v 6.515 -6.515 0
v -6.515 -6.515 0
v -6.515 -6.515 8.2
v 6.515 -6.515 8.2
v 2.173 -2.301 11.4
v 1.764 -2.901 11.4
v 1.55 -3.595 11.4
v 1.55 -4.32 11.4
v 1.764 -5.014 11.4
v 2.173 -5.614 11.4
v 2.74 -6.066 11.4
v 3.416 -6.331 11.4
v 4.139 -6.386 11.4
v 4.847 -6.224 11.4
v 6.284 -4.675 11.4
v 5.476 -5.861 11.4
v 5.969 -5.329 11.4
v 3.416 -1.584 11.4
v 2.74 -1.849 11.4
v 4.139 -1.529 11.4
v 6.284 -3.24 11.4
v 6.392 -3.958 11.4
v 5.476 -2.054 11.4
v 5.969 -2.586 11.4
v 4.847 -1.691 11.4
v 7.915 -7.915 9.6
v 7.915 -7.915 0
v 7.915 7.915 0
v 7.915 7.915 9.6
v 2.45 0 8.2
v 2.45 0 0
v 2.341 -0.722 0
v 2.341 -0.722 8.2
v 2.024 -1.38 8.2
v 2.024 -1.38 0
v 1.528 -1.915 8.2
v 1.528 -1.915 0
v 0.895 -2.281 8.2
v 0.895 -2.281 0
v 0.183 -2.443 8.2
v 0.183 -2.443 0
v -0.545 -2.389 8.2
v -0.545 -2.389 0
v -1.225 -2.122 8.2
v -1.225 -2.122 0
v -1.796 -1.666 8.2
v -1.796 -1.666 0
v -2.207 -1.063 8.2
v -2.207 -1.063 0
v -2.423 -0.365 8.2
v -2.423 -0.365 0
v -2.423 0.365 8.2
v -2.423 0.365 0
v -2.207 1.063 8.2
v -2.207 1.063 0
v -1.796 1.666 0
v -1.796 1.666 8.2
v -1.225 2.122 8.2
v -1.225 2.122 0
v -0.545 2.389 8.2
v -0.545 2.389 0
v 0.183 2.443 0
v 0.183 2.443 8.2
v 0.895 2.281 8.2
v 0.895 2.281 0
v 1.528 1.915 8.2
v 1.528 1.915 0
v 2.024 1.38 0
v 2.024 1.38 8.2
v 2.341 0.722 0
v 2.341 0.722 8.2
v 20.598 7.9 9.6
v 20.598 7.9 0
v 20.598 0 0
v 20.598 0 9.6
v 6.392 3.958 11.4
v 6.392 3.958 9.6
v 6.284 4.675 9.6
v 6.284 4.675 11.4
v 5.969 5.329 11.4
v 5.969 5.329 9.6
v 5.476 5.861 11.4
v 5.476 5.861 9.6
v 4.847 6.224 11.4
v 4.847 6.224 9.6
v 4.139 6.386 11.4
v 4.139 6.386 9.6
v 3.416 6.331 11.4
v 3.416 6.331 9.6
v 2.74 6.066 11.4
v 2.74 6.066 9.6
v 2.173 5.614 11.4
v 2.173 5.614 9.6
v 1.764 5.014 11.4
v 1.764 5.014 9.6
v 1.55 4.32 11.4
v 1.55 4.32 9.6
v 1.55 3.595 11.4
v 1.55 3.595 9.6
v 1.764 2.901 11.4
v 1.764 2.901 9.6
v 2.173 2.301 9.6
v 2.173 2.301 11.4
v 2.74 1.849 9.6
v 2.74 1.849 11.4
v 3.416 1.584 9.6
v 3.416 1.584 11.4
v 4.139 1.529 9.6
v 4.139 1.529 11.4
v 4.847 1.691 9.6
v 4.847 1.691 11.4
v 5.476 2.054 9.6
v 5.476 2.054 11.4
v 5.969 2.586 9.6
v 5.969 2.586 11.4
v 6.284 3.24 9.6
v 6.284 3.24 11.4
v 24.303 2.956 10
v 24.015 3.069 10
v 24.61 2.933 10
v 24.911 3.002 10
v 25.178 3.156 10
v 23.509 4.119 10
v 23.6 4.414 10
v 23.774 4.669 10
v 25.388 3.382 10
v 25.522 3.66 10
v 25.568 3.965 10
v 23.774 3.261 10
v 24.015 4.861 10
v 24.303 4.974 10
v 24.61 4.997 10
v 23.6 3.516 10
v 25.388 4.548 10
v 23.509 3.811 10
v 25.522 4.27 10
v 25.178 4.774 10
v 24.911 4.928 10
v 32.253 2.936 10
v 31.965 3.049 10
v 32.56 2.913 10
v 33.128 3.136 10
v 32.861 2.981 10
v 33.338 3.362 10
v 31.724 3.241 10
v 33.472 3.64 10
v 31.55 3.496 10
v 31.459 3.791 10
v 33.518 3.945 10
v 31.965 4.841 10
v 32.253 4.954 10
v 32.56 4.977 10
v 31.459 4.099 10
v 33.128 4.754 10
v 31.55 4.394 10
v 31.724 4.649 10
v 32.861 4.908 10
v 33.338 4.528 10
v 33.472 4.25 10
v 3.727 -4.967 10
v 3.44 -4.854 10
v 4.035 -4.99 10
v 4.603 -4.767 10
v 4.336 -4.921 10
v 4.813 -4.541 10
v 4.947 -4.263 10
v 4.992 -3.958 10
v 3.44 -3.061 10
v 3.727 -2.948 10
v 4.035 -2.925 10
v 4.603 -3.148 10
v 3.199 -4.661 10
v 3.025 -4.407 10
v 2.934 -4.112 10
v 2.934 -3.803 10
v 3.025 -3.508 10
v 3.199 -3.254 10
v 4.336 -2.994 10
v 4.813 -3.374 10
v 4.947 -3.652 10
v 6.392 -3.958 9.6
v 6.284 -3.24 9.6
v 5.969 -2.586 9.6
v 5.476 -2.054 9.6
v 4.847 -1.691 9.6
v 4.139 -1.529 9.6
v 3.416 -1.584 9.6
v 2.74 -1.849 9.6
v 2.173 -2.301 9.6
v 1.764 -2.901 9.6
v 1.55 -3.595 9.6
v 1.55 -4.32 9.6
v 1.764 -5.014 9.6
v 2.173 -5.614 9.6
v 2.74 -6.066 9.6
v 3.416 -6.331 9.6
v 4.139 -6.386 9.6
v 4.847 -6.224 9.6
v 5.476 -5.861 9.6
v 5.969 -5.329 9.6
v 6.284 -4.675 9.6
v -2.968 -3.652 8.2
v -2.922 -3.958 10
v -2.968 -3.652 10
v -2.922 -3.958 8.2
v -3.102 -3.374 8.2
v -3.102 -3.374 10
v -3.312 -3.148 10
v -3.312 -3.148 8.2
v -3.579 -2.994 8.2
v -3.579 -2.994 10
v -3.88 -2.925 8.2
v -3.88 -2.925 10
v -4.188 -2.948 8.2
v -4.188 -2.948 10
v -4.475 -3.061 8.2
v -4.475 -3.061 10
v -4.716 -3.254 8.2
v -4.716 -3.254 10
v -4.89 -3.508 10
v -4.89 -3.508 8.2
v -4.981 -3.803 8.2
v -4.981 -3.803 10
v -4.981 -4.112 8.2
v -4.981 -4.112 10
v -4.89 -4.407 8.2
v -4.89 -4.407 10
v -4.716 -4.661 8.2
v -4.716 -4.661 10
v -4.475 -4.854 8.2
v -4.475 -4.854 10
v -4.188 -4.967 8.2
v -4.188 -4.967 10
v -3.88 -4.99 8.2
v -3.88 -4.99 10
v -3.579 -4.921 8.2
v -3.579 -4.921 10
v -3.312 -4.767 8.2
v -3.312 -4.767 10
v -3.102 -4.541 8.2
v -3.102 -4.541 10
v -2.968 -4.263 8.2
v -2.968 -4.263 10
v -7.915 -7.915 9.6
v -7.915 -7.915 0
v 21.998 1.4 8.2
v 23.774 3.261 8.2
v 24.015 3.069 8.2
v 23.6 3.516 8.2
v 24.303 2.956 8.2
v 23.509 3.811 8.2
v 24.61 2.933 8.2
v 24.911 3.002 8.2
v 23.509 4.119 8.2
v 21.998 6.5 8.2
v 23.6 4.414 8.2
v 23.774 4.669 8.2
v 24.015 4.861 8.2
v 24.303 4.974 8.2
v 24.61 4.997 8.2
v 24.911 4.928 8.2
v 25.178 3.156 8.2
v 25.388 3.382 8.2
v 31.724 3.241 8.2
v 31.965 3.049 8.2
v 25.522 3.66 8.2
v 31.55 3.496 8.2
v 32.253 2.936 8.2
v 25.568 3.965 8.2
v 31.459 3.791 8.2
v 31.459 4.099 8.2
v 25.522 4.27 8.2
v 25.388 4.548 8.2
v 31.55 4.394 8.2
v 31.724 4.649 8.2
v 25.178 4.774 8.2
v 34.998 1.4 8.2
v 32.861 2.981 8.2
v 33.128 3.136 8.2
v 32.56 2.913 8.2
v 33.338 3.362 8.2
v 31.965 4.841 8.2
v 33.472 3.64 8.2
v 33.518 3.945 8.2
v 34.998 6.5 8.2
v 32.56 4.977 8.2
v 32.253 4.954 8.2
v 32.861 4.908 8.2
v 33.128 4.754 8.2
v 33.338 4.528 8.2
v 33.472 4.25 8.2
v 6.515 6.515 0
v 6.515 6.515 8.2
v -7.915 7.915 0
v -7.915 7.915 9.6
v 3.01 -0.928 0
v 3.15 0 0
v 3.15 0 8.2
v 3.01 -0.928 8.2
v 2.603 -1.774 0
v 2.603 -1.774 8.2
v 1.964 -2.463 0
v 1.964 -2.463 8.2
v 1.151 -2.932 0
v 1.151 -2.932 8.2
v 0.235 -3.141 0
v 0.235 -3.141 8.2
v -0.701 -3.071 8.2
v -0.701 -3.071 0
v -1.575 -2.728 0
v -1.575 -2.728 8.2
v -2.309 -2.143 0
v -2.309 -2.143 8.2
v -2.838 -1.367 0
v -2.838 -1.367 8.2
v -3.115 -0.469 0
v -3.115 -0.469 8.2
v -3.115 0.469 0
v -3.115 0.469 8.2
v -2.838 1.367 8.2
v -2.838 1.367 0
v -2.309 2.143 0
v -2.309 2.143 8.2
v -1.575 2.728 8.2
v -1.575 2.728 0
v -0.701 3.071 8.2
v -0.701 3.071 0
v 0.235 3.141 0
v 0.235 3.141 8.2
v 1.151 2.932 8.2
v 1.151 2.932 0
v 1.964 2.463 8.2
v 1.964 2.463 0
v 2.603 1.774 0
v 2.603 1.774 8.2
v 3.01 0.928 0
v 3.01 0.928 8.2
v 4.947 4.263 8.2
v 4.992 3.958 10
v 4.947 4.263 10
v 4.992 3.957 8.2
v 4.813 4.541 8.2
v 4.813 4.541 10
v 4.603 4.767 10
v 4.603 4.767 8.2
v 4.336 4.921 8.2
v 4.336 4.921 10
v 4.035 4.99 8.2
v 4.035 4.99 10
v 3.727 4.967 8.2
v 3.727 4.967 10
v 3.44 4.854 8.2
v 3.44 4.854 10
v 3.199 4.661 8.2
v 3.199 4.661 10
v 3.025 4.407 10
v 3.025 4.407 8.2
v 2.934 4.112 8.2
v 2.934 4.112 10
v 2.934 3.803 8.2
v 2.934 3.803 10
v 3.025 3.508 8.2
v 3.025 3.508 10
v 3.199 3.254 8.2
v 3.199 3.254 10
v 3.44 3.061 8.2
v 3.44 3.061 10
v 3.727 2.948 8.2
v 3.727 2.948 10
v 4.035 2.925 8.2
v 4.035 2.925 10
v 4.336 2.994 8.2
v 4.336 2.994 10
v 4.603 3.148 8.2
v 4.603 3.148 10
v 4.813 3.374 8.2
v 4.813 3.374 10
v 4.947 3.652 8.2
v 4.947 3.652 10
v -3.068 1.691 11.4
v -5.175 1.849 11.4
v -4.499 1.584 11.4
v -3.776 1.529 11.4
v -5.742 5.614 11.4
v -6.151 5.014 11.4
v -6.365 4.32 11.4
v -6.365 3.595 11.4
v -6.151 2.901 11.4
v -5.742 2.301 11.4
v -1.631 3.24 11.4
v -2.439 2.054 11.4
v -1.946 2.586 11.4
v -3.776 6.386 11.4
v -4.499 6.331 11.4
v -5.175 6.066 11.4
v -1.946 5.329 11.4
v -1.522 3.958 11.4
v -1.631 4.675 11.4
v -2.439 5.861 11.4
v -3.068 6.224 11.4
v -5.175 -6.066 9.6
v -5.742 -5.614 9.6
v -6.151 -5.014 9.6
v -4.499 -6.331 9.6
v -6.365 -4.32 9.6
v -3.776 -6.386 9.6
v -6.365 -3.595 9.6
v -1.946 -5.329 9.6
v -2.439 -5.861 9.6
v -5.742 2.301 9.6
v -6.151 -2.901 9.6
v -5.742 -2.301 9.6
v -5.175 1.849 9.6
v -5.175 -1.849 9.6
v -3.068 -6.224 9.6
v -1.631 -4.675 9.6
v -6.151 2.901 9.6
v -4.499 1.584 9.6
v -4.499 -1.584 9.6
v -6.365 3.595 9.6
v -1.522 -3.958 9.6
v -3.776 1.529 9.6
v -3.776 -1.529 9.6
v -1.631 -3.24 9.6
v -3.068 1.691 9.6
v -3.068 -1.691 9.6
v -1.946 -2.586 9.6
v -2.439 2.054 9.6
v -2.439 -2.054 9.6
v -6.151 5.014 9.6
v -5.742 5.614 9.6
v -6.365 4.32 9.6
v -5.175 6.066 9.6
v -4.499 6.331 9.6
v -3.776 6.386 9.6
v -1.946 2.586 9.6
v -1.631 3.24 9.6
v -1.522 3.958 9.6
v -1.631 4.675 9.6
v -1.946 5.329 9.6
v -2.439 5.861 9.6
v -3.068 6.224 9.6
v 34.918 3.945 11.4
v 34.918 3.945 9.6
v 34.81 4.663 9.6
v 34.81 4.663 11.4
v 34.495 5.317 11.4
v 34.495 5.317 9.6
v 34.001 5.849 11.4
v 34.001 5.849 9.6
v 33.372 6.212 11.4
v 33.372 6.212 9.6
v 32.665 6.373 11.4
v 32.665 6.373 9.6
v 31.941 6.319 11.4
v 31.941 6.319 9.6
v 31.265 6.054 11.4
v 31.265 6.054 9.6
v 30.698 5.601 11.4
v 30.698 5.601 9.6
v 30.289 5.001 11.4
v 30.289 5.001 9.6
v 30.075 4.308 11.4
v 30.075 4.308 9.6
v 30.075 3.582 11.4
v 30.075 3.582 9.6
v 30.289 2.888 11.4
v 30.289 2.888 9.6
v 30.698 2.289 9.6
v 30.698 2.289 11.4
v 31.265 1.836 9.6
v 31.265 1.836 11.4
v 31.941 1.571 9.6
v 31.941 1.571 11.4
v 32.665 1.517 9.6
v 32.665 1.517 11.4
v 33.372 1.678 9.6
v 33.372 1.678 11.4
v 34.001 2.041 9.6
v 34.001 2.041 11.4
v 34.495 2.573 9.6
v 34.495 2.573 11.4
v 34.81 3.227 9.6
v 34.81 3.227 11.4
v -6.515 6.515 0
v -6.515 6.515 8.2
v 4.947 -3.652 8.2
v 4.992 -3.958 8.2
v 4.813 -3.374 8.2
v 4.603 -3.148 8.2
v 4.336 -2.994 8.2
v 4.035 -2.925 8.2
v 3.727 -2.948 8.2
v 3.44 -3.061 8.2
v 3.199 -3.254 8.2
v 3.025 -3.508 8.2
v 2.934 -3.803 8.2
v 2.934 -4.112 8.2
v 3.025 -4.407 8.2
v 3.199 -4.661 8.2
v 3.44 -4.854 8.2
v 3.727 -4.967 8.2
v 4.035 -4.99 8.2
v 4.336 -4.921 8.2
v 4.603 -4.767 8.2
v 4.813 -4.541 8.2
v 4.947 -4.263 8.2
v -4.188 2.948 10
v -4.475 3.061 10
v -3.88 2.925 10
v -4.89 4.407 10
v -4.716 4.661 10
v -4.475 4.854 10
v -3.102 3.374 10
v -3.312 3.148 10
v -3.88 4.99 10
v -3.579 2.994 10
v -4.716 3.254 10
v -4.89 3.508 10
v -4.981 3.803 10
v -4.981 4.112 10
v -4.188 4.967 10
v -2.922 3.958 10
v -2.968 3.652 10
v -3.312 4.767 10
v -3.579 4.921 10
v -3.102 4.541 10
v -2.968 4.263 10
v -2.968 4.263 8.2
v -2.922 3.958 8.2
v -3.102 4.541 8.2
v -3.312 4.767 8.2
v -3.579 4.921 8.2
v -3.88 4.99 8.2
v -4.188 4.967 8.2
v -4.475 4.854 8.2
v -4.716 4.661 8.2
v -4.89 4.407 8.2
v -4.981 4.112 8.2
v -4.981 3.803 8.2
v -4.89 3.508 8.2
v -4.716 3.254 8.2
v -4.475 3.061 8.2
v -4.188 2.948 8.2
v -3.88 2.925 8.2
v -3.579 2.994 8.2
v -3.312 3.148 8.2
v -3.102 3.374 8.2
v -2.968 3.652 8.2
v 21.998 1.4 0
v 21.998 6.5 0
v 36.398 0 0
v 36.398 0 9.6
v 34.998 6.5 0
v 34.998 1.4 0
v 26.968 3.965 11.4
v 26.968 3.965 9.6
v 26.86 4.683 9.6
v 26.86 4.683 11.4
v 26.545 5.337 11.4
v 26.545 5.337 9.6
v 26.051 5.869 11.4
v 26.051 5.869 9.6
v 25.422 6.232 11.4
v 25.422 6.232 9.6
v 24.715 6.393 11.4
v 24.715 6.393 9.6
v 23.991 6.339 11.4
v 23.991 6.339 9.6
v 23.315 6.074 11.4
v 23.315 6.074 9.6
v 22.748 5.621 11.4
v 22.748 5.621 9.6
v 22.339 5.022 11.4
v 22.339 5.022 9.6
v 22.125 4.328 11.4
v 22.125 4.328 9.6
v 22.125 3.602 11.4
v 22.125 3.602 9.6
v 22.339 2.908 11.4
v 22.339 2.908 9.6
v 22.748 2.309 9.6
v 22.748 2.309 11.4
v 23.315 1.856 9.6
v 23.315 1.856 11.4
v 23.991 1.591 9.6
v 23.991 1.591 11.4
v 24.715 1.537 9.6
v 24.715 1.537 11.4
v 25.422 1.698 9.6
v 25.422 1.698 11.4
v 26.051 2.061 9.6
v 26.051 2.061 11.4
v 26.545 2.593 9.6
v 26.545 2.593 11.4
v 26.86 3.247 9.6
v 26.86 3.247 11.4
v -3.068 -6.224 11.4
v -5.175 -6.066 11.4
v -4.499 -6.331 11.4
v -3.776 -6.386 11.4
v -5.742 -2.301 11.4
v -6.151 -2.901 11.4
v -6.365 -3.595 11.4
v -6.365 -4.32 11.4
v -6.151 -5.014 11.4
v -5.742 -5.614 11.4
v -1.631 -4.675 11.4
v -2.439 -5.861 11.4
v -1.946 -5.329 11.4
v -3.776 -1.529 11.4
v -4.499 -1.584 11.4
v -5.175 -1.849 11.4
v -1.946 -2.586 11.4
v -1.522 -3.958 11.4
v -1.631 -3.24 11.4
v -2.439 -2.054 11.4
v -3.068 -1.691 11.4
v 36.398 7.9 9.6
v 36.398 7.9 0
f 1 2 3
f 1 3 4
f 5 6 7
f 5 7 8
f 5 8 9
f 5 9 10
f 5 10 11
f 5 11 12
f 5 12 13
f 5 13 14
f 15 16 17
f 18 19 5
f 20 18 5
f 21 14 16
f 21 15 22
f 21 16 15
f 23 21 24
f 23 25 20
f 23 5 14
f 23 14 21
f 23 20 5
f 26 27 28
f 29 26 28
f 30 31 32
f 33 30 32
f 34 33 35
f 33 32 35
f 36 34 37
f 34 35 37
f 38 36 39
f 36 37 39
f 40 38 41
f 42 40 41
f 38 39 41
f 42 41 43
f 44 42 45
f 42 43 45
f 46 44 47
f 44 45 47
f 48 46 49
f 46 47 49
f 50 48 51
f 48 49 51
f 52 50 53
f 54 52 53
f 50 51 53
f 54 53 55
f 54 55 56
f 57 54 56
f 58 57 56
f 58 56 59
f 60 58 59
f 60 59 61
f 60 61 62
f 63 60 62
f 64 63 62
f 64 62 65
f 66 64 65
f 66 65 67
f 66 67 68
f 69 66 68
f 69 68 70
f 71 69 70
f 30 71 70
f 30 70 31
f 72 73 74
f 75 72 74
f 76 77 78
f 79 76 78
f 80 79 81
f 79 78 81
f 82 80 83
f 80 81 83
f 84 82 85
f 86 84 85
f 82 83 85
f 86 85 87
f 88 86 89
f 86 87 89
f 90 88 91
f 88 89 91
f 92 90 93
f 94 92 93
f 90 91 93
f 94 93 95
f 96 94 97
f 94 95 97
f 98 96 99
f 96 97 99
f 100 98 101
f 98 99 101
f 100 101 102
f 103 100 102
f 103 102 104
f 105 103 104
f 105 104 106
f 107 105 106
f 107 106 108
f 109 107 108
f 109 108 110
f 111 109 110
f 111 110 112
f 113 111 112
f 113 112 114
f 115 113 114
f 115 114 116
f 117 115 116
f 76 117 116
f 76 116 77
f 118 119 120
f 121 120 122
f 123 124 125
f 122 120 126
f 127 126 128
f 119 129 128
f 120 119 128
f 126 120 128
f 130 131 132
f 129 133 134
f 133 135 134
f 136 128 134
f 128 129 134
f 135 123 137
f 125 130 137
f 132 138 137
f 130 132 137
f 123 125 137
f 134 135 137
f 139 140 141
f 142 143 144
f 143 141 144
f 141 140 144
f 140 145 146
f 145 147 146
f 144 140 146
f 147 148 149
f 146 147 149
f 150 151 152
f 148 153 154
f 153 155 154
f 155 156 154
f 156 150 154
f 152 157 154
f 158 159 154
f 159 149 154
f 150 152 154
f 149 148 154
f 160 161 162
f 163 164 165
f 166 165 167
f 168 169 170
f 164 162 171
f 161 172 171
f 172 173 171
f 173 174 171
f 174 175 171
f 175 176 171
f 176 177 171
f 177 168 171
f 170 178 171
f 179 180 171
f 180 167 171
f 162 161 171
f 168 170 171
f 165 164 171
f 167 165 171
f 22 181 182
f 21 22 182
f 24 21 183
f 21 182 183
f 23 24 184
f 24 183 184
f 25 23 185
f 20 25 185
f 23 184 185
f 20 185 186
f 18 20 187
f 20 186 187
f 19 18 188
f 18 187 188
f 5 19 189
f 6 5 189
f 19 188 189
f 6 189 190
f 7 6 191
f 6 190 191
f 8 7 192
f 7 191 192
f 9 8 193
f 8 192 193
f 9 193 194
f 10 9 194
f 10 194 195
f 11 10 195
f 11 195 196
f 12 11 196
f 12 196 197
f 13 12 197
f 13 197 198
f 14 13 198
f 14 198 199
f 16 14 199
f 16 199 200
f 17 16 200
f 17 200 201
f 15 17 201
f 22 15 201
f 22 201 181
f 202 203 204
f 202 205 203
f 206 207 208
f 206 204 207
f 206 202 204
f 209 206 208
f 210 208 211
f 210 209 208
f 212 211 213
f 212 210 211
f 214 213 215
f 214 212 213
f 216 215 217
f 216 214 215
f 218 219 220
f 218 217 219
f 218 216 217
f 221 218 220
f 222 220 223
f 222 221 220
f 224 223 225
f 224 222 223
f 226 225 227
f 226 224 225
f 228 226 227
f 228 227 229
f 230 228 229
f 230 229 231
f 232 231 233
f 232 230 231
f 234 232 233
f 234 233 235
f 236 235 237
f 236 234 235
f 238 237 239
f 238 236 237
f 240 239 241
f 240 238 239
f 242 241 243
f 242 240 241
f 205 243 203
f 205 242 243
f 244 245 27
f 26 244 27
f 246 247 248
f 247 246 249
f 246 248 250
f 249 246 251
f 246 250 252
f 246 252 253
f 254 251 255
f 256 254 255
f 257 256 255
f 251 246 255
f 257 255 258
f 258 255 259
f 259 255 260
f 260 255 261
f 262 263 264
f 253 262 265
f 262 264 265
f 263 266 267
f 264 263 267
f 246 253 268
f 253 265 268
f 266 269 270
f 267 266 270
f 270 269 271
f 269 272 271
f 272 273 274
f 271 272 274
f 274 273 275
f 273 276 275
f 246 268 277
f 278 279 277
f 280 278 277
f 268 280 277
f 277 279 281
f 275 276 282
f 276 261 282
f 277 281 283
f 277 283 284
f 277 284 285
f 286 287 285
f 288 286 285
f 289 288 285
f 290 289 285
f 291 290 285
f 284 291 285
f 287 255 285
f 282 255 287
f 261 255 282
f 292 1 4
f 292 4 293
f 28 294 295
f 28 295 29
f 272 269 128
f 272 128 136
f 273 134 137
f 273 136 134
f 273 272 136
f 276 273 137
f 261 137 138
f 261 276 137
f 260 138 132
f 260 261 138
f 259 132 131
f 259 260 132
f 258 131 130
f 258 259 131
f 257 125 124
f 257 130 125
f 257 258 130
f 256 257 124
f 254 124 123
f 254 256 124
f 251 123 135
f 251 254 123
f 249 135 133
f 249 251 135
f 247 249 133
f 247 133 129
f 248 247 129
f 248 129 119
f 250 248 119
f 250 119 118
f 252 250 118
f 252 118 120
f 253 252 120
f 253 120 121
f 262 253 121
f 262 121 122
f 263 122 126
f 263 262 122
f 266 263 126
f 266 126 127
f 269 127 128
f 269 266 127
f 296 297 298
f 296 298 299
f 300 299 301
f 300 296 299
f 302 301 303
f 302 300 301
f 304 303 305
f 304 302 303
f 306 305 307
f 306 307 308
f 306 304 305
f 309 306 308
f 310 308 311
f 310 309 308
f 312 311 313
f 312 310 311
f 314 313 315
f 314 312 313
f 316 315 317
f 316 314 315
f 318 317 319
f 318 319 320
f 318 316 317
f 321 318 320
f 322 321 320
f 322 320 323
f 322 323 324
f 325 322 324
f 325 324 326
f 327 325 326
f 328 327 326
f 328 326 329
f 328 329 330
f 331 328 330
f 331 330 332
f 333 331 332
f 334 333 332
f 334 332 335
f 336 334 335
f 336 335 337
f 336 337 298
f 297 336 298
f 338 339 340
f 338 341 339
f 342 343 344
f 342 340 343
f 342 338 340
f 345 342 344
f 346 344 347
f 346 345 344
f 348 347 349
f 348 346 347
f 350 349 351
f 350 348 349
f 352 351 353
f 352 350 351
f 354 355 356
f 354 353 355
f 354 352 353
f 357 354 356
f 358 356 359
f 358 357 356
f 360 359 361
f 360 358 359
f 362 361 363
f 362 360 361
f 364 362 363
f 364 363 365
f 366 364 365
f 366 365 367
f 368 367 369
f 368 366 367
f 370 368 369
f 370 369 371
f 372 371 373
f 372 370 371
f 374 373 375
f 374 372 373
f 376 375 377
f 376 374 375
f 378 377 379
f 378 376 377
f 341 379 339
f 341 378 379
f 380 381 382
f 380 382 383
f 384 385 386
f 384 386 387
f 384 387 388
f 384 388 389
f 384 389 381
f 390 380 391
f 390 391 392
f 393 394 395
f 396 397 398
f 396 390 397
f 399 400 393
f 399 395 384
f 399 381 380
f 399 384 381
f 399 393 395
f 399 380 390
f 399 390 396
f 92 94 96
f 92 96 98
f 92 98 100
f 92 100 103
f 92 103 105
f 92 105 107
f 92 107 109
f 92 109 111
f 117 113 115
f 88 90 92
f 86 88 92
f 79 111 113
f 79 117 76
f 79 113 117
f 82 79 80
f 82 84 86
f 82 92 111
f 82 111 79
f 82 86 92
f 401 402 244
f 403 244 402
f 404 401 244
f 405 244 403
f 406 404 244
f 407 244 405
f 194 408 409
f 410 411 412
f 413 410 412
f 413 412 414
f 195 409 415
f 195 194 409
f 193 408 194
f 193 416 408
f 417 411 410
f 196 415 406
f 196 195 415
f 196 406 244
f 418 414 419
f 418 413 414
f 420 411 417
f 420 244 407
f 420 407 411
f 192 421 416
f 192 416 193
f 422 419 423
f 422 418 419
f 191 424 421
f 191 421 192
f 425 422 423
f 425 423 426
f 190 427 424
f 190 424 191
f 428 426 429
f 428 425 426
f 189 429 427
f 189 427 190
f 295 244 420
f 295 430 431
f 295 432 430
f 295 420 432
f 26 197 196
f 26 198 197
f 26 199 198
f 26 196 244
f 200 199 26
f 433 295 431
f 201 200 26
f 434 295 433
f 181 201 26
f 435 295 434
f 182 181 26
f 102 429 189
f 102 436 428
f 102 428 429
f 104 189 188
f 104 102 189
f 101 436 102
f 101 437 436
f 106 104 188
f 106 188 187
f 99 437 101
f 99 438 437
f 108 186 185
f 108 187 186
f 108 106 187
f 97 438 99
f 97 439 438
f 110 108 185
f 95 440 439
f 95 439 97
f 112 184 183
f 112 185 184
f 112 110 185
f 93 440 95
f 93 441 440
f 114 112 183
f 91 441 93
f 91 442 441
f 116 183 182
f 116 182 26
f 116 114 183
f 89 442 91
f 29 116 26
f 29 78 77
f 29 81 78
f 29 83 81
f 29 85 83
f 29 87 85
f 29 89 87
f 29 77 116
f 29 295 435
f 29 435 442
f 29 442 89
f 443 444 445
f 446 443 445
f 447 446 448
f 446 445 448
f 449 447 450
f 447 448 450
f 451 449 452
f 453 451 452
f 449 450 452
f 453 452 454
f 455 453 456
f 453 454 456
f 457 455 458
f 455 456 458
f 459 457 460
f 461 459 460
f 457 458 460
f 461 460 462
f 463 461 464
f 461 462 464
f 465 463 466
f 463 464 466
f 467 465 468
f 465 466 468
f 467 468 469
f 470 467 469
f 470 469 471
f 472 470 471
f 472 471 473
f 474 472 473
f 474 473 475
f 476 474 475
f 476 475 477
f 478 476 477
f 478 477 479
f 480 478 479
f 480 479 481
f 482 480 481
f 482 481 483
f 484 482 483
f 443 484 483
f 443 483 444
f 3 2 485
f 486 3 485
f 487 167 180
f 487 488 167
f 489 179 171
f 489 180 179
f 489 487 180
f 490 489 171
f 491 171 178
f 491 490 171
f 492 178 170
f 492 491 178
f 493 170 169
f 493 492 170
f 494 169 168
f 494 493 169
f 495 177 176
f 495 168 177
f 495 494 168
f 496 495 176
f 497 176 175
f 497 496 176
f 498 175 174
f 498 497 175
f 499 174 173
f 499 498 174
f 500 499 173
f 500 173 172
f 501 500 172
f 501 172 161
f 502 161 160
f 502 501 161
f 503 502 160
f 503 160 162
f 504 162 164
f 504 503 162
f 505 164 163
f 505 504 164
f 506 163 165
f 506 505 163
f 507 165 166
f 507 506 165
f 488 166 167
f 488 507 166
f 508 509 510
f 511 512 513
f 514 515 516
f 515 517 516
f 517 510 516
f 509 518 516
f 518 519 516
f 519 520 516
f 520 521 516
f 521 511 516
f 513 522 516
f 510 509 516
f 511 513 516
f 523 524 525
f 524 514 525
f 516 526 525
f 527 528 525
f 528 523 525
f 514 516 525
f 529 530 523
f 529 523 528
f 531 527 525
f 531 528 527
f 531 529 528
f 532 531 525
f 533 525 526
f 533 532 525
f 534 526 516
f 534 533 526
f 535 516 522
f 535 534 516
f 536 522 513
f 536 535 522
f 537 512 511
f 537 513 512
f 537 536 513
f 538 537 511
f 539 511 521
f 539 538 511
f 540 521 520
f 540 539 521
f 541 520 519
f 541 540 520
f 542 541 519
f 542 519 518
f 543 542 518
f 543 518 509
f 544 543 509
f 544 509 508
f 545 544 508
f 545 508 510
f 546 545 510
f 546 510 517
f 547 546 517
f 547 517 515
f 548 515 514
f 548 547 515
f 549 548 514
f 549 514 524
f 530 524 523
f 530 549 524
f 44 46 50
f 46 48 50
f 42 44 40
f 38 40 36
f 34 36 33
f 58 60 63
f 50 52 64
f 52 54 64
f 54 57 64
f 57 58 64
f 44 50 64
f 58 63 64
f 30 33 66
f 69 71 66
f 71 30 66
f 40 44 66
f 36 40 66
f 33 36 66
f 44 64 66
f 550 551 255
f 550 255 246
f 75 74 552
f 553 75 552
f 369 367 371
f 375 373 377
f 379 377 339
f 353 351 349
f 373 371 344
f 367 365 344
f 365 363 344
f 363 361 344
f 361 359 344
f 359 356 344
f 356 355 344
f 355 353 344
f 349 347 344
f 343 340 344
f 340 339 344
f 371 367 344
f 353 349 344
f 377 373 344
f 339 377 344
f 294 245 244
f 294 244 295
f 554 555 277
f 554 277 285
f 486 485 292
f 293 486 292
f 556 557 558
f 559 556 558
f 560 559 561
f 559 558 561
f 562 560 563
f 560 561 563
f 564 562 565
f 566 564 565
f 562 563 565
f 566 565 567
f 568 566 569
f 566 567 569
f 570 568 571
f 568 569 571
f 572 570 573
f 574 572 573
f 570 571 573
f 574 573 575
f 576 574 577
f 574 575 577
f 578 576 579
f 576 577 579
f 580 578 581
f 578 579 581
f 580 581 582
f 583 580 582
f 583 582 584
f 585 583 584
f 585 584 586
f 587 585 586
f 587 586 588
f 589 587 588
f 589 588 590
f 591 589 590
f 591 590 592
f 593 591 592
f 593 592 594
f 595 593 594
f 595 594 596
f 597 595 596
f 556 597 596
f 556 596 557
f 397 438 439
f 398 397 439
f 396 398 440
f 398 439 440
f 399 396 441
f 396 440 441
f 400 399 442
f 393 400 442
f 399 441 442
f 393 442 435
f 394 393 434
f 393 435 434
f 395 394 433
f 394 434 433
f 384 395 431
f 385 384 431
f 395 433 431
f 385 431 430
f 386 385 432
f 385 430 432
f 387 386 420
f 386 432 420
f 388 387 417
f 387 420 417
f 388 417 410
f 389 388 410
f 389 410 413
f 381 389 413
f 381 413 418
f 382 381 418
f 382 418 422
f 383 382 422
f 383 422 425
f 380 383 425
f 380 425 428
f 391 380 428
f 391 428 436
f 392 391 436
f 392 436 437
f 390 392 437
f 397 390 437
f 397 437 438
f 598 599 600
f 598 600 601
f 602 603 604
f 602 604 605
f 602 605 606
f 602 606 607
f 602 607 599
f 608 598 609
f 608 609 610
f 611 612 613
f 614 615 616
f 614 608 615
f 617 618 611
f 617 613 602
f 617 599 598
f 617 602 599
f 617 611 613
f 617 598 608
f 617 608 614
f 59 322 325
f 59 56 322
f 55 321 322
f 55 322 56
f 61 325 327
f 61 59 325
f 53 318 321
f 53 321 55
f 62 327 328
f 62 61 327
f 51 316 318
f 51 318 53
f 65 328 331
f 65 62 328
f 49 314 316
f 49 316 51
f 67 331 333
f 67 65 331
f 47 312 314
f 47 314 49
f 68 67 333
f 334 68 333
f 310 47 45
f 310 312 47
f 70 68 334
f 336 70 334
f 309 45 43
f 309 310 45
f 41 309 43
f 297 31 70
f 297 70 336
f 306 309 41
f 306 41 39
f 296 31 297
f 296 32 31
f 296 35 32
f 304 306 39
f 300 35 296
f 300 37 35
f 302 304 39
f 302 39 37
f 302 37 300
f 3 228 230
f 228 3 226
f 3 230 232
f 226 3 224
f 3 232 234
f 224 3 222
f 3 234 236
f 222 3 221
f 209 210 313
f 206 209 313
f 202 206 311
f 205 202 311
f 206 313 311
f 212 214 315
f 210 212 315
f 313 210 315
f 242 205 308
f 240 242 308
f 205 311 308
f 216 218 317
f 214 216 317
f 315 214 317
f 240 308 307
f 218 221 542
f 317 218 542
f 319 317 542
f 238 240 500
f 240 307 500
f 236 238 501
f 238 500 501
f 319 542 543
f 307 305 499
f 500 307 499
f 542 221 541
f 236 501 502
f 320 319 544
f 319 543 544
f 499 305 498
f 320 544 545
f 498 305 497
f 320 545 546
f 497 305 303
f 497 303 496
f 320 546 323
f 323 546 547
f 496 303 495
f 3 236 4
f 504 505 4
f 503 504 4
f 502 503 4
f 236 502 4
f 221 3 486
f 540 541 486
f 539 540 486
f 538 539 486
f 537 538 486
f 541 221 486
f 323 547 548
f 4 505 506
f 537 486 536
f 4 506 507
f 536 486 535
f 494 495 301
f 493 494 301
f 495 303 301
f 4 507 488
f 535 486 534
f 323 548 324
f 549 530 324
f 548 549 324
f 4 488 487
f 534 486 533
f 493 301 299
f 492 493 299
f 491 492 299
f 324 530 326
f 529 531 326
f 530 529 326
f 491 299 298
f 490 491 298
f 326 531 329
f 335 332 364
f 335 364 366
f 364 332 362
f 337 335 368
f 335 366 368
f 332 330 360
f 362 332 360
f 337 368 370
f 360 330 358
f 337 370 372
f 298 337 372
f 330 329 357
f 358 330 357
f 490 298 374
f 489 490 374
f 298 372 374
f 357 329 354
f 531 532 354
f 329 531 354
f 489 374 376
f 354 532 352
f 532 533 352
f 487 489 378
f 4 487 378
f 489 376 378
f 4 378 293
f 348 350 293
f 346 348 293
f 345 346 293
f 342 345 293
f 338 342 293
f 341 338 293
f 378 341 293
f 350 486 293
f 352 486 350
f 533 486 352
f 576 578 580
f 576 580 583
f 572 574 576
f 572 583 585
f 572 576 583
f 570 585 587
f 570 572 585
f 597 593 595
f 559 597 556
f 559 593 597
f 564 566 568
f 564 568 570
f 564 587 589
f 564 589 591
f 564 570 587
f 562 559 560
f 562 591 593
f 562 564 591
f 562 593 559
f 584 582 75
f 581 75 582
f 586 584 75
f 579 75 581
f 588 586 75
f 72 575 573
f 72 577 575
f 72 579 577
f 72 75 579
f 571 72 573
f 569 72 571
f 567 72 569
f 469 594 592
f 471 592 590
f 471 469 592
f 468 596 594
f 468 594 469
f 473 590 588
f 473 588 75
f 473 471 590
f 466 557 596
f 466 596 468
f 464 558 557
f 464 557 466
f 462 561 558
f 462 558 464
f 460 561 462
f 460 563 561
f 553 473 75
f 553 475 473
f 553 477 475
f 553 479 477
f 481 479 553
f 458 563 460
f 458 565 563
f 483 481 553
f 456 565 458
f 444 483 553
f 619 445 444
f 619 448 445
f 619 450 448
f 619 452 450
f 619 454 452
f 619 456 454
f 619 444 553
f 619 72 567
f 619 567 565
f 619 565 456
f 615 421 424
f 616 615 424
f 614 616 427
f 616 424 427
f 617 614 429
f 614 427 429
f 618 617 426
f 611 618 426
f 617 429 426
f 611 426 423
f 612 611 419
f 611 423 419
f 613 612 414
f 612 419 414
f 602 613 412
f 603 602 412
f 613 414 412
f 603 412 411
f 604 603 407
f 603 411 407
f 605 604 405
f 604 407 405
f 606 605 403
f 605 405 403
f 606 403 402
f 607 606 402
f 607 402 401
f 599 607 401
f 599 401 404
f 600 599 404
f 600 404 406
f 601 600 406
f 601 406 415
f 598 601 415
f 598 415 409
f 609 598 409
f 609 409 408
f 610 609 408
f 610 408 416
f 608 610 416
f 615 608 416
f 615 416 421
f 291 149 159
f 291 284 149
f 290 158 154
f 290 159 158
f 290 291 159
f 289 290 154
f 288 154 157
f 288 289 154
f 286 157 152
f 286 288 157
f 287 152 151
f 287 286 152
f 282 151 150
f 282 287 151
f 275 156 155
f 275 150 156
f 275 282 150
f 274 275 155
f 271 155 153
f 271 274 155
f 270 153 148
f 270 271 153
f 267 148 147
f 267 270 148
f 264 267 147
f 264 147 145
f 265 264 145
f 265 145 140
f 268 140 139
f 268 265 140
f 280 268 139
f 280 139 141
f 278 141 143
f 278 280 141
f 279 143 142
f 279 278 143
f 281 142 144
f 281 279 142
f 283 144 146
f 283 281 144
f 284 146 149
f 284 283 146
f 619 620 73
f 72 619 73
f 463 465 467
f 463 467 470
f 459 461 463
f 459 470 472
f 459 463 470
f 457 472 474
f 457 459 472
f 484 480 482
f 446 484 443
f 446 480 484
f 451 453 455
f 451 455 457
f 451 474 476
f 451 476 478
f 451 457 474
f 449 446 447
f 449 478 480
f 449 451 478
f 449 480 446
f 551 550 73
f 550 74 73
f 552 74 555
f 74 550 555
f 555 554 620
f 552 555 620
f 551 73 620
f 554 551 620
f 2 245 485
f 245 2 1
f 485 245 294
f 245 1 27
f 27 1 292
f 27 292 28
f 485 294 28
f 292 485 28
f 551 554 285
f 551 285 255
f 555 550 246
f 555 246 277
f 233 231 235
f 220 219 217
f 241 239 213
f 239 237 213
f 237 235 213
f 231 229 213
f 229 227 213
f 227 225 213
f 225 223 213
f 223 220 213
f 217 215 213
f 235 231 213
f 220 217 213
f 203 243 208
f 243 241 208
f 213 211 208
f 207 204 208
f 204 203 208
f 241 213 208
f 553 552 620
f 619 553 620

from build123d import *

# Parameters (mm, degrees)
F0_W     = 15.83
F0_H     = 15.83
F0_R     = 2.435
F1_DEPTH = 9.6
F2_DEPTH = 11.4
F4_T     = -1.4
F5_T     = -1.4
F3_R     = 3.15
F3_R_2   = 2.45
F6_DEPTH = 9.5


with BuildPart() as f1:
    # F0 (on Top) → F1 (new body)
    with BuildSketch(Plane.XY):
        Rectangle(F0_W, F0_H)
        with Locations((-3.9575, -3.9575)):
            Circle(F0_R, mode=Mode.SUBTRACT)
        with Locations((3.9575, -3.9575)):
            Circle(F0_R, mode=Mode.SUBTRACT)
        with Locations((-3.9575, 3.9575)):
            Circle(F0_R, mode=Mode.SUBTRACT)
        with Locations((3.9575, 3.9575)):
            Circle(F0_R, mode=Mode.SUBTRACT)
    extrude(amount=F1_DEPTH)

    # F0 (on Top) → F2, piece 2 (join)
    with BuildSketch(Plane.XY):
        with Locations((-3.9575, 3.9575)):
            Circle(F0_R)
        with Locations((3.9575, 3.9575)):
            Circle(F0_R)
        with Locations((3.9575, -3.9575)):
            Circle(F0_R)
        with Locations((-3.9575, -3.9575)):
            Circle(F0_R)
    extrude(amount=F2_DEPTH)

    # F4
    f4_openings = [f1.faces().sort_by_distance(p)[0] for p in [
        (0, 0, 0),
    ]]
    offset(amount=F4_T, openings=f4_openings, kind=Kind.INTERSECTION)

    # F3 (on face) → F6 (join)
    with BuildSketch(Plane(origin=(0, 0, 0), x_dir=(1, 0, 0), z_dir=(0, 0, -1))):
        Circle(F3_R)
        Circle(F3_R_2, mode=Mode.SUBTRACT)
    extrude(amount=-F6_DEPTH)


with BuildPart() as f1b:
    # F0 (on Top) → F1, piece 2 (new body)
    with BuildSketch(Plane.XY):
        Polygon((22.0978542477, 7.9), (20.5978542477, 7.9), (20.5978542477, 6.4), (20.5978542477, 0), (36.3978542477, 0), (36.3978542477, 7.9), (30.0678542477, 7.9), (28.5178542477, 7.9), (26.9678542477, 7.9), align=None)
        with Locations((32.4828792435, 3.9448733544)):
            Circle(F0_R, mode=Mode.SUBTRACT)
        with Locations((24.5328542477, 3.965)):
            Circle(F0_R, mode=Mode.SUBTRACT)
    extrude(amount=F1_DEPTH)

    # F0 (on Top) → F2 (join)
    with BuildSketch(Plane.XY):
        with Locations((24.5328542477, 3.965)):
            Circle(F0_R)
        with Locations((32.4828792435, 3.9448733544)):
            Circle(F0_R)
    extrude(amount=F2_DEPTH)

    # F5
    f5_openings = [f1b.faces().sort_by_distance(p)[0] for p in [
        (28.497854, 3.95, 0),
    ]]
    offset(amount=F5_T, openings=f5_openings, kind=Kind.INTERSECTION)


solid = Compound([f1.part, f1b.part])
